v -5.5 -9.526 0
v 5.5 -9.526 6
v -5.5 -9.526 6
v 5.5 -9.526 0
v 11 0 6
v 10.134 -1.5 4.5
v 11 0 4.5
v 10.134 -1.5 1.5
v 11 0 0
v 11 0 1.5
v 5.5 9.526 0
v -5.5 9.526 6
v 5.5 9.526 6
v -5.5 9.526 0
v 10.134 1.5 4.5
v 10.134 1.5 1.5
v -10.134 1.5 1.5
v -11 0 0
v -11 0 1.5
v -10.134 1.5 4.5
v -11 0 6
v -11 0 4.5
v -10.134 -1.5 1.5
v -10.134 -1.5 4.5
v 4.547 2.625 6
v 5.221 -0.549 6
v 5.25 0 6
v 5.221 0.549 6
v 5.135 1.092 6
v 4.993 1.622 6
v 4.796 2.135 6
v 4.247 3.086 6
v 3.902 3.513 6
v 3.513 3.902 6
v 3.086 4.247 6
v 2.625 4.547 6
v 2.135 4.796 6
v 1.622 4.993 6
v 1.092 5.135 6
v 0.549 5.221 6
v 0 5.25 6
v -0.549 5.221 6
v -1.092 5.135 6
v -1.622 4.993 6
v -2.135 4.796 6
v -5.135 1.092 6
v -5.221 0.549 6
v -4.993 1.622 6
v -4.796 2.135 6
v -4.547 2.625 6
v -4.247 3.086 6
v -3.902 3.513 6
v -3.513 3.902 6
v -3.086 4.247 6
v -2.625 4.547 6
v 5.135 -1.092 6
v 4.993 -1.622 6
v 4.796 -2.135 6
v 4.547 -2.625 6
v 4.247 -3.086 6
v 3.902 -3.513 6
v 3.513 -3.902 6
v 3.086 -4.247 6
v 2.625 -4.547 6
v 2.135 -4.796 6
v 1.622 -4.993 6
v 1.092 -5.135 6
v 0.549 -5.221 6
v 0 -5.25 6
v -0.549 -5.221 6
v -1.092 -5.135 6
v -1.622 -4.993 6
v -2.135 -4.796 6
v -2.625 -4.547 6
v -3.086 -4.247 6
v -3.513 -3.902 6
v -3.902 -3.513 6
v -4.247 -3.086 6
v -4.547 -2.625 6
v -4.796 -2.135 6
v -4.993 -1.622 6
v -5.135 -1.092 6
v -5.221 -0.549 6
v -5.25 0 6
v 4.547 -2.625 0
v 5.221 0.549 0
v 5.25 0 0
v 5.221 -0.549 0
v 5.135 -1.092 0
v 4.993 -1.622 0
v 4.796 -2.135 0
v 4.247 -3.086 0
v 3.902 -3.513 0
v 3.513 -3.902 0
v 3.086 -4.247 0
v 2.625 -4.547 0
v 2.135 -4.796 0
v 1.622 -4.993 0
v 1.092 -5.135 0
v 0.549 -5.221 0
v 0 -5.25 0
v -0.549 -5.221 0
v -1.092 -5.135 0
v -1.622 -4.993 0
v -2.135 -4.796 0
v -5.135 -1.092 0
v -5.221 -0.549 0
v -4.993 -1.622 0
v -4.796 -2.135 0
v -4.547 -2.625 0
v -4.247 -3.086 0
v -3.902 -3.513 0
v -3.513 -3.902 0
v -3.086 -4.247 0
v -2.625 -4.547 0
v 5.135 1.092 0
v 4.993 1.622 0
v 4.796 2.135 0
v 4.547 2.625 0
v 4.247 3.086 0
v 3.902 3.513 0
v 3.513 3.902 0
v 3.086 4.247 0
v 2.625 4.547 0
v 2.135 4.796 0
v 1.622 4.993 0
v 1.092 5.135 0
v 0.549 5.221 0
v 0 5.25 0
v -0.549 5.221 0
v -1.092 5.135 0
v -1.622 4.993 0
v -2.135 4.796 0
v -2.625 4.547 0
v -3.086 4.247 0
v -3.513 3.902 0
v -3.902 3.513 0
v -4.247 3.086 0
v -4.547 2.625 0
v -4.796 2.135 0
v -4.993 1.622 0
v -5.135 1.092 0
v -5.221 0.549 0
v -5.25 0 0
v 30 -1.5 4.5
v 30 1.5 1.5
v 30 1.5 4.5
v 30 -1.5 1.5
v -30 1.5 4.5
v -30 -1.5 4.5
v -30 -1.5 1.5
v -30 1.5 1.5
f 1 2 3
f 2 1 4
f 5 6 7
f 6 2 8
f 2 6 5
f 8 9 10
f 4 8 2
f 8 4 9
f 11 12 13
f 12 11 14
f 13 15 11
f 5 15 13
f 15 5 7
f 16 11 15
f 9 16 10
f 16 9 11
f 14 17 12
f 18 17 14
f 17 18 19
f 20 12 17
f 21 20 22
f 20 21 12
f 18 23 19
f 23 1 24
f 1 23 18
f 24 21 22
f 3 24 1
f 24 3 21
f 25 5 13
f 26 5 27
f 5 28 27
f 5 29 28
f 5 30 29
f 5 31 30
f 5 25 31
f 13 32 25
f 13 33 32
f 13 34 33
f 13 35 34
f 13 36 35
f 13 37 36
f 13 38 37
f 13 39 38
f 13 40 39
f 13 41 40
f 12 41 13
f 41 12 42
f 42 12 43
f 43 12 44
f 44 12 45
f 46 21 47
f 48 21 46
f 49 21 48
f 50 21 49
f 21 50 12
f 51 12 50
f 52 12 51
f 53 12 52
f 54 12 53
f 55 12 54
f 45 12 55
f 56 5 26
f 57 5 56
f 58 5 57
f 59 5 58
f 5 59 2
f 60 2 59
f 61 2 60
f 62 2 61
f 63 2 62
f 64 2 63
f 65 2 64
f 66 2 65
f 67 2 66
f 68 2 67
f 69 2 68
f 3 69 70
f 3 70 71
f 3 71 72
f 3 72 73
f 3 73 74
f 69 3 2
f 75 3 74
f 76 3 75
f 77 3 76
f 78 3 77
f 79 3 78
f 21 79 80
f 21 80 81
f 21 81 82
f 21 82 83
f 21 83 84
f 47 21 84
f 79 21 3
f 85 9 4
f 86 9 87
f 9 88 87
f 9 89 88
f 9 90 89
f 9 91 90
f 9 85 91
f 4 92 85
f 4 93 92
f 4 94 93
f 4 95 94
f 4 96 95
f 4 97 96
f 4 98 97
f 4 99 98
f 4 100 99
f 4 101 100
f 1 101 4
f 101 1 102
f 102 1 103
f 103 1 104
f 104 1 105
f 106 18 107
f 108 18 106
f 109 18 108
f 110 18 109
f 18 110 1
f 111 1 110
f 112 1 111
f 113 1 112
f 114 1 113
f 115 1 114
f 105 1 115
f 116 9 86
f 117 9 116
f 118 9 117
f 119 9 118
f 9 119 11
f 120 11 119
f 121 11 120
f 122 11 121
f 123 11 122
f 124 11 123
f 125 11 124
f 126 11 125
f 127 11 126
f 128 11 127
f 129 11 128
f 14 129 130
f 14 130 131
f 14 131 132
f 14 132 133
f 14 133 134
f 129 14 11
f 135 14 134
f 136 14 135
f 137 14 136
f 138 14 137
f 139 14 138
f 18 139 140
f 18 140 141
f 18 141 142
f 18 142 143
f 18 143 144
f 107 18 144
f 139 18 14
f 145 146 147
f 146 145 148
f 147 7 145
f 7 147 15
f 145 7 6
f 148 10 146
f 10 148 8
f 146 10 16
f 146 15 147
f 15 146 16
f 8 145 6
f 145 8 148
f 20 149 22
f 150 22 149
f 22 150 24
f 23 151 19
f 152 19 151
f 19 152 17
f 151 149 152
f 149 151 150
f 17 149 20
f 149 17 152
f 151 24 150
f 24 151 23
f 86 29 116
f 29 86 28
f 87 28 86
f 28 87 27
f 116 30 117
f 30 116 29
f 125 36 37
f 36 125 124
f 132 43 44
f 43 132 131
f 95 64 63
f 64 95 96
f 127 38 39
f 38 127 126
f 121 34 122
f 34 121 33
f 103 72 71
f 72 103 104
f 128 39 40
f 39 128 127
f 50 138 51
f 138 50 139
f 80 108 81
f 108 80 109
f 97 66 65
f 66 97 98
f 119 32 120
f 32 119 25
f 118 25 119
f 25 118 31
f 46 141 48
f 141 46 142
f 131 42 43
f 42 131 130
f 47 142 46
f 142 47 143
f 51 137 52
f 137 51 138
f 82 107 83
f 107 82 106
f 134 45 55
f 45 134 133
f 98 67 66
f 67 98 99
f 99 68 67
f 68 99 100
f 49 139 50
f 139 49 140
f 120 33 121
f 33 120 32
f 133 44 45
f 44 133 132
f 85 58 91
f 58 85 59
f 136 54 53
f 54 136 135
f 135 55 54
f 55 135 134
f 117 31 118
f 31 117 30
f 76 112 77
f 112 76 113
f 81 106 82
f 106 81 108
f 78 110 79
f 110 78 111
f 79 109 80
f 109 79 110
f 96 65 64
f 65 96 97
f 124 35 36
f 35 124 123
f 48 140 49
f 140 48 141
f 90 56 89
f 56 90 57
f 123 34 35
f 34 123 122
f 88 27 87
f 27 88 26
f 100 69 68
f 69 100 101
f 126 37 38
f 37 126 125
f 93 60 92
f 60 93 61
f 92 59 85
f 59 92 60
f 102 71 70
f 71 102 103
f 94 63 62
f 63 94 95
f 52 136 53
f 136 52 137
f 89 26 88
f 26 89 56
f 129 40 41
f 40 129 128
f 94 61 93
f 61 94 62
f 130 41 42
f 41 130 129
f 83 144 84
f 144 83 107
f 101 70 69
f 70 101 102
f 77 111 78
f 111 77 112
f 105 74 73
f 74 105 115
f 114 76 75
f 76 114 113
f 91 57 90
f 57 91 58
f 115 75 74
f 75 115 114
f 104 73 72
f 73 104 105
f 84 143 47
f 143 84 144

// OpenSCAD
// Wing nut with two reinforced wings.
$fn = 60;
eps = 0.02;
thread_d = 10.5;
body_d = 22;
body_h = 6;
wing_l = 20;
wing_t = 3;
difference() {
    union() {
        cylinder(d = body_d, h = body_h, $fn = 6);
        translate([body_d / 2 - 1, -wing_t / 2, body_h / 2 - wing_t / 2]) cube([wing_l, wing_t, wing_t]);
        translate([-body_d / 2 - wing_l + 1, -wing_t / 2, body_h / 2 - wing_t / 2]) cube([wing_l, wing_t, wing_t]);
    }
    translate([0, 0, -eps]) cylinder(d = thread_d, h = body_h + 2 * eps);
}
